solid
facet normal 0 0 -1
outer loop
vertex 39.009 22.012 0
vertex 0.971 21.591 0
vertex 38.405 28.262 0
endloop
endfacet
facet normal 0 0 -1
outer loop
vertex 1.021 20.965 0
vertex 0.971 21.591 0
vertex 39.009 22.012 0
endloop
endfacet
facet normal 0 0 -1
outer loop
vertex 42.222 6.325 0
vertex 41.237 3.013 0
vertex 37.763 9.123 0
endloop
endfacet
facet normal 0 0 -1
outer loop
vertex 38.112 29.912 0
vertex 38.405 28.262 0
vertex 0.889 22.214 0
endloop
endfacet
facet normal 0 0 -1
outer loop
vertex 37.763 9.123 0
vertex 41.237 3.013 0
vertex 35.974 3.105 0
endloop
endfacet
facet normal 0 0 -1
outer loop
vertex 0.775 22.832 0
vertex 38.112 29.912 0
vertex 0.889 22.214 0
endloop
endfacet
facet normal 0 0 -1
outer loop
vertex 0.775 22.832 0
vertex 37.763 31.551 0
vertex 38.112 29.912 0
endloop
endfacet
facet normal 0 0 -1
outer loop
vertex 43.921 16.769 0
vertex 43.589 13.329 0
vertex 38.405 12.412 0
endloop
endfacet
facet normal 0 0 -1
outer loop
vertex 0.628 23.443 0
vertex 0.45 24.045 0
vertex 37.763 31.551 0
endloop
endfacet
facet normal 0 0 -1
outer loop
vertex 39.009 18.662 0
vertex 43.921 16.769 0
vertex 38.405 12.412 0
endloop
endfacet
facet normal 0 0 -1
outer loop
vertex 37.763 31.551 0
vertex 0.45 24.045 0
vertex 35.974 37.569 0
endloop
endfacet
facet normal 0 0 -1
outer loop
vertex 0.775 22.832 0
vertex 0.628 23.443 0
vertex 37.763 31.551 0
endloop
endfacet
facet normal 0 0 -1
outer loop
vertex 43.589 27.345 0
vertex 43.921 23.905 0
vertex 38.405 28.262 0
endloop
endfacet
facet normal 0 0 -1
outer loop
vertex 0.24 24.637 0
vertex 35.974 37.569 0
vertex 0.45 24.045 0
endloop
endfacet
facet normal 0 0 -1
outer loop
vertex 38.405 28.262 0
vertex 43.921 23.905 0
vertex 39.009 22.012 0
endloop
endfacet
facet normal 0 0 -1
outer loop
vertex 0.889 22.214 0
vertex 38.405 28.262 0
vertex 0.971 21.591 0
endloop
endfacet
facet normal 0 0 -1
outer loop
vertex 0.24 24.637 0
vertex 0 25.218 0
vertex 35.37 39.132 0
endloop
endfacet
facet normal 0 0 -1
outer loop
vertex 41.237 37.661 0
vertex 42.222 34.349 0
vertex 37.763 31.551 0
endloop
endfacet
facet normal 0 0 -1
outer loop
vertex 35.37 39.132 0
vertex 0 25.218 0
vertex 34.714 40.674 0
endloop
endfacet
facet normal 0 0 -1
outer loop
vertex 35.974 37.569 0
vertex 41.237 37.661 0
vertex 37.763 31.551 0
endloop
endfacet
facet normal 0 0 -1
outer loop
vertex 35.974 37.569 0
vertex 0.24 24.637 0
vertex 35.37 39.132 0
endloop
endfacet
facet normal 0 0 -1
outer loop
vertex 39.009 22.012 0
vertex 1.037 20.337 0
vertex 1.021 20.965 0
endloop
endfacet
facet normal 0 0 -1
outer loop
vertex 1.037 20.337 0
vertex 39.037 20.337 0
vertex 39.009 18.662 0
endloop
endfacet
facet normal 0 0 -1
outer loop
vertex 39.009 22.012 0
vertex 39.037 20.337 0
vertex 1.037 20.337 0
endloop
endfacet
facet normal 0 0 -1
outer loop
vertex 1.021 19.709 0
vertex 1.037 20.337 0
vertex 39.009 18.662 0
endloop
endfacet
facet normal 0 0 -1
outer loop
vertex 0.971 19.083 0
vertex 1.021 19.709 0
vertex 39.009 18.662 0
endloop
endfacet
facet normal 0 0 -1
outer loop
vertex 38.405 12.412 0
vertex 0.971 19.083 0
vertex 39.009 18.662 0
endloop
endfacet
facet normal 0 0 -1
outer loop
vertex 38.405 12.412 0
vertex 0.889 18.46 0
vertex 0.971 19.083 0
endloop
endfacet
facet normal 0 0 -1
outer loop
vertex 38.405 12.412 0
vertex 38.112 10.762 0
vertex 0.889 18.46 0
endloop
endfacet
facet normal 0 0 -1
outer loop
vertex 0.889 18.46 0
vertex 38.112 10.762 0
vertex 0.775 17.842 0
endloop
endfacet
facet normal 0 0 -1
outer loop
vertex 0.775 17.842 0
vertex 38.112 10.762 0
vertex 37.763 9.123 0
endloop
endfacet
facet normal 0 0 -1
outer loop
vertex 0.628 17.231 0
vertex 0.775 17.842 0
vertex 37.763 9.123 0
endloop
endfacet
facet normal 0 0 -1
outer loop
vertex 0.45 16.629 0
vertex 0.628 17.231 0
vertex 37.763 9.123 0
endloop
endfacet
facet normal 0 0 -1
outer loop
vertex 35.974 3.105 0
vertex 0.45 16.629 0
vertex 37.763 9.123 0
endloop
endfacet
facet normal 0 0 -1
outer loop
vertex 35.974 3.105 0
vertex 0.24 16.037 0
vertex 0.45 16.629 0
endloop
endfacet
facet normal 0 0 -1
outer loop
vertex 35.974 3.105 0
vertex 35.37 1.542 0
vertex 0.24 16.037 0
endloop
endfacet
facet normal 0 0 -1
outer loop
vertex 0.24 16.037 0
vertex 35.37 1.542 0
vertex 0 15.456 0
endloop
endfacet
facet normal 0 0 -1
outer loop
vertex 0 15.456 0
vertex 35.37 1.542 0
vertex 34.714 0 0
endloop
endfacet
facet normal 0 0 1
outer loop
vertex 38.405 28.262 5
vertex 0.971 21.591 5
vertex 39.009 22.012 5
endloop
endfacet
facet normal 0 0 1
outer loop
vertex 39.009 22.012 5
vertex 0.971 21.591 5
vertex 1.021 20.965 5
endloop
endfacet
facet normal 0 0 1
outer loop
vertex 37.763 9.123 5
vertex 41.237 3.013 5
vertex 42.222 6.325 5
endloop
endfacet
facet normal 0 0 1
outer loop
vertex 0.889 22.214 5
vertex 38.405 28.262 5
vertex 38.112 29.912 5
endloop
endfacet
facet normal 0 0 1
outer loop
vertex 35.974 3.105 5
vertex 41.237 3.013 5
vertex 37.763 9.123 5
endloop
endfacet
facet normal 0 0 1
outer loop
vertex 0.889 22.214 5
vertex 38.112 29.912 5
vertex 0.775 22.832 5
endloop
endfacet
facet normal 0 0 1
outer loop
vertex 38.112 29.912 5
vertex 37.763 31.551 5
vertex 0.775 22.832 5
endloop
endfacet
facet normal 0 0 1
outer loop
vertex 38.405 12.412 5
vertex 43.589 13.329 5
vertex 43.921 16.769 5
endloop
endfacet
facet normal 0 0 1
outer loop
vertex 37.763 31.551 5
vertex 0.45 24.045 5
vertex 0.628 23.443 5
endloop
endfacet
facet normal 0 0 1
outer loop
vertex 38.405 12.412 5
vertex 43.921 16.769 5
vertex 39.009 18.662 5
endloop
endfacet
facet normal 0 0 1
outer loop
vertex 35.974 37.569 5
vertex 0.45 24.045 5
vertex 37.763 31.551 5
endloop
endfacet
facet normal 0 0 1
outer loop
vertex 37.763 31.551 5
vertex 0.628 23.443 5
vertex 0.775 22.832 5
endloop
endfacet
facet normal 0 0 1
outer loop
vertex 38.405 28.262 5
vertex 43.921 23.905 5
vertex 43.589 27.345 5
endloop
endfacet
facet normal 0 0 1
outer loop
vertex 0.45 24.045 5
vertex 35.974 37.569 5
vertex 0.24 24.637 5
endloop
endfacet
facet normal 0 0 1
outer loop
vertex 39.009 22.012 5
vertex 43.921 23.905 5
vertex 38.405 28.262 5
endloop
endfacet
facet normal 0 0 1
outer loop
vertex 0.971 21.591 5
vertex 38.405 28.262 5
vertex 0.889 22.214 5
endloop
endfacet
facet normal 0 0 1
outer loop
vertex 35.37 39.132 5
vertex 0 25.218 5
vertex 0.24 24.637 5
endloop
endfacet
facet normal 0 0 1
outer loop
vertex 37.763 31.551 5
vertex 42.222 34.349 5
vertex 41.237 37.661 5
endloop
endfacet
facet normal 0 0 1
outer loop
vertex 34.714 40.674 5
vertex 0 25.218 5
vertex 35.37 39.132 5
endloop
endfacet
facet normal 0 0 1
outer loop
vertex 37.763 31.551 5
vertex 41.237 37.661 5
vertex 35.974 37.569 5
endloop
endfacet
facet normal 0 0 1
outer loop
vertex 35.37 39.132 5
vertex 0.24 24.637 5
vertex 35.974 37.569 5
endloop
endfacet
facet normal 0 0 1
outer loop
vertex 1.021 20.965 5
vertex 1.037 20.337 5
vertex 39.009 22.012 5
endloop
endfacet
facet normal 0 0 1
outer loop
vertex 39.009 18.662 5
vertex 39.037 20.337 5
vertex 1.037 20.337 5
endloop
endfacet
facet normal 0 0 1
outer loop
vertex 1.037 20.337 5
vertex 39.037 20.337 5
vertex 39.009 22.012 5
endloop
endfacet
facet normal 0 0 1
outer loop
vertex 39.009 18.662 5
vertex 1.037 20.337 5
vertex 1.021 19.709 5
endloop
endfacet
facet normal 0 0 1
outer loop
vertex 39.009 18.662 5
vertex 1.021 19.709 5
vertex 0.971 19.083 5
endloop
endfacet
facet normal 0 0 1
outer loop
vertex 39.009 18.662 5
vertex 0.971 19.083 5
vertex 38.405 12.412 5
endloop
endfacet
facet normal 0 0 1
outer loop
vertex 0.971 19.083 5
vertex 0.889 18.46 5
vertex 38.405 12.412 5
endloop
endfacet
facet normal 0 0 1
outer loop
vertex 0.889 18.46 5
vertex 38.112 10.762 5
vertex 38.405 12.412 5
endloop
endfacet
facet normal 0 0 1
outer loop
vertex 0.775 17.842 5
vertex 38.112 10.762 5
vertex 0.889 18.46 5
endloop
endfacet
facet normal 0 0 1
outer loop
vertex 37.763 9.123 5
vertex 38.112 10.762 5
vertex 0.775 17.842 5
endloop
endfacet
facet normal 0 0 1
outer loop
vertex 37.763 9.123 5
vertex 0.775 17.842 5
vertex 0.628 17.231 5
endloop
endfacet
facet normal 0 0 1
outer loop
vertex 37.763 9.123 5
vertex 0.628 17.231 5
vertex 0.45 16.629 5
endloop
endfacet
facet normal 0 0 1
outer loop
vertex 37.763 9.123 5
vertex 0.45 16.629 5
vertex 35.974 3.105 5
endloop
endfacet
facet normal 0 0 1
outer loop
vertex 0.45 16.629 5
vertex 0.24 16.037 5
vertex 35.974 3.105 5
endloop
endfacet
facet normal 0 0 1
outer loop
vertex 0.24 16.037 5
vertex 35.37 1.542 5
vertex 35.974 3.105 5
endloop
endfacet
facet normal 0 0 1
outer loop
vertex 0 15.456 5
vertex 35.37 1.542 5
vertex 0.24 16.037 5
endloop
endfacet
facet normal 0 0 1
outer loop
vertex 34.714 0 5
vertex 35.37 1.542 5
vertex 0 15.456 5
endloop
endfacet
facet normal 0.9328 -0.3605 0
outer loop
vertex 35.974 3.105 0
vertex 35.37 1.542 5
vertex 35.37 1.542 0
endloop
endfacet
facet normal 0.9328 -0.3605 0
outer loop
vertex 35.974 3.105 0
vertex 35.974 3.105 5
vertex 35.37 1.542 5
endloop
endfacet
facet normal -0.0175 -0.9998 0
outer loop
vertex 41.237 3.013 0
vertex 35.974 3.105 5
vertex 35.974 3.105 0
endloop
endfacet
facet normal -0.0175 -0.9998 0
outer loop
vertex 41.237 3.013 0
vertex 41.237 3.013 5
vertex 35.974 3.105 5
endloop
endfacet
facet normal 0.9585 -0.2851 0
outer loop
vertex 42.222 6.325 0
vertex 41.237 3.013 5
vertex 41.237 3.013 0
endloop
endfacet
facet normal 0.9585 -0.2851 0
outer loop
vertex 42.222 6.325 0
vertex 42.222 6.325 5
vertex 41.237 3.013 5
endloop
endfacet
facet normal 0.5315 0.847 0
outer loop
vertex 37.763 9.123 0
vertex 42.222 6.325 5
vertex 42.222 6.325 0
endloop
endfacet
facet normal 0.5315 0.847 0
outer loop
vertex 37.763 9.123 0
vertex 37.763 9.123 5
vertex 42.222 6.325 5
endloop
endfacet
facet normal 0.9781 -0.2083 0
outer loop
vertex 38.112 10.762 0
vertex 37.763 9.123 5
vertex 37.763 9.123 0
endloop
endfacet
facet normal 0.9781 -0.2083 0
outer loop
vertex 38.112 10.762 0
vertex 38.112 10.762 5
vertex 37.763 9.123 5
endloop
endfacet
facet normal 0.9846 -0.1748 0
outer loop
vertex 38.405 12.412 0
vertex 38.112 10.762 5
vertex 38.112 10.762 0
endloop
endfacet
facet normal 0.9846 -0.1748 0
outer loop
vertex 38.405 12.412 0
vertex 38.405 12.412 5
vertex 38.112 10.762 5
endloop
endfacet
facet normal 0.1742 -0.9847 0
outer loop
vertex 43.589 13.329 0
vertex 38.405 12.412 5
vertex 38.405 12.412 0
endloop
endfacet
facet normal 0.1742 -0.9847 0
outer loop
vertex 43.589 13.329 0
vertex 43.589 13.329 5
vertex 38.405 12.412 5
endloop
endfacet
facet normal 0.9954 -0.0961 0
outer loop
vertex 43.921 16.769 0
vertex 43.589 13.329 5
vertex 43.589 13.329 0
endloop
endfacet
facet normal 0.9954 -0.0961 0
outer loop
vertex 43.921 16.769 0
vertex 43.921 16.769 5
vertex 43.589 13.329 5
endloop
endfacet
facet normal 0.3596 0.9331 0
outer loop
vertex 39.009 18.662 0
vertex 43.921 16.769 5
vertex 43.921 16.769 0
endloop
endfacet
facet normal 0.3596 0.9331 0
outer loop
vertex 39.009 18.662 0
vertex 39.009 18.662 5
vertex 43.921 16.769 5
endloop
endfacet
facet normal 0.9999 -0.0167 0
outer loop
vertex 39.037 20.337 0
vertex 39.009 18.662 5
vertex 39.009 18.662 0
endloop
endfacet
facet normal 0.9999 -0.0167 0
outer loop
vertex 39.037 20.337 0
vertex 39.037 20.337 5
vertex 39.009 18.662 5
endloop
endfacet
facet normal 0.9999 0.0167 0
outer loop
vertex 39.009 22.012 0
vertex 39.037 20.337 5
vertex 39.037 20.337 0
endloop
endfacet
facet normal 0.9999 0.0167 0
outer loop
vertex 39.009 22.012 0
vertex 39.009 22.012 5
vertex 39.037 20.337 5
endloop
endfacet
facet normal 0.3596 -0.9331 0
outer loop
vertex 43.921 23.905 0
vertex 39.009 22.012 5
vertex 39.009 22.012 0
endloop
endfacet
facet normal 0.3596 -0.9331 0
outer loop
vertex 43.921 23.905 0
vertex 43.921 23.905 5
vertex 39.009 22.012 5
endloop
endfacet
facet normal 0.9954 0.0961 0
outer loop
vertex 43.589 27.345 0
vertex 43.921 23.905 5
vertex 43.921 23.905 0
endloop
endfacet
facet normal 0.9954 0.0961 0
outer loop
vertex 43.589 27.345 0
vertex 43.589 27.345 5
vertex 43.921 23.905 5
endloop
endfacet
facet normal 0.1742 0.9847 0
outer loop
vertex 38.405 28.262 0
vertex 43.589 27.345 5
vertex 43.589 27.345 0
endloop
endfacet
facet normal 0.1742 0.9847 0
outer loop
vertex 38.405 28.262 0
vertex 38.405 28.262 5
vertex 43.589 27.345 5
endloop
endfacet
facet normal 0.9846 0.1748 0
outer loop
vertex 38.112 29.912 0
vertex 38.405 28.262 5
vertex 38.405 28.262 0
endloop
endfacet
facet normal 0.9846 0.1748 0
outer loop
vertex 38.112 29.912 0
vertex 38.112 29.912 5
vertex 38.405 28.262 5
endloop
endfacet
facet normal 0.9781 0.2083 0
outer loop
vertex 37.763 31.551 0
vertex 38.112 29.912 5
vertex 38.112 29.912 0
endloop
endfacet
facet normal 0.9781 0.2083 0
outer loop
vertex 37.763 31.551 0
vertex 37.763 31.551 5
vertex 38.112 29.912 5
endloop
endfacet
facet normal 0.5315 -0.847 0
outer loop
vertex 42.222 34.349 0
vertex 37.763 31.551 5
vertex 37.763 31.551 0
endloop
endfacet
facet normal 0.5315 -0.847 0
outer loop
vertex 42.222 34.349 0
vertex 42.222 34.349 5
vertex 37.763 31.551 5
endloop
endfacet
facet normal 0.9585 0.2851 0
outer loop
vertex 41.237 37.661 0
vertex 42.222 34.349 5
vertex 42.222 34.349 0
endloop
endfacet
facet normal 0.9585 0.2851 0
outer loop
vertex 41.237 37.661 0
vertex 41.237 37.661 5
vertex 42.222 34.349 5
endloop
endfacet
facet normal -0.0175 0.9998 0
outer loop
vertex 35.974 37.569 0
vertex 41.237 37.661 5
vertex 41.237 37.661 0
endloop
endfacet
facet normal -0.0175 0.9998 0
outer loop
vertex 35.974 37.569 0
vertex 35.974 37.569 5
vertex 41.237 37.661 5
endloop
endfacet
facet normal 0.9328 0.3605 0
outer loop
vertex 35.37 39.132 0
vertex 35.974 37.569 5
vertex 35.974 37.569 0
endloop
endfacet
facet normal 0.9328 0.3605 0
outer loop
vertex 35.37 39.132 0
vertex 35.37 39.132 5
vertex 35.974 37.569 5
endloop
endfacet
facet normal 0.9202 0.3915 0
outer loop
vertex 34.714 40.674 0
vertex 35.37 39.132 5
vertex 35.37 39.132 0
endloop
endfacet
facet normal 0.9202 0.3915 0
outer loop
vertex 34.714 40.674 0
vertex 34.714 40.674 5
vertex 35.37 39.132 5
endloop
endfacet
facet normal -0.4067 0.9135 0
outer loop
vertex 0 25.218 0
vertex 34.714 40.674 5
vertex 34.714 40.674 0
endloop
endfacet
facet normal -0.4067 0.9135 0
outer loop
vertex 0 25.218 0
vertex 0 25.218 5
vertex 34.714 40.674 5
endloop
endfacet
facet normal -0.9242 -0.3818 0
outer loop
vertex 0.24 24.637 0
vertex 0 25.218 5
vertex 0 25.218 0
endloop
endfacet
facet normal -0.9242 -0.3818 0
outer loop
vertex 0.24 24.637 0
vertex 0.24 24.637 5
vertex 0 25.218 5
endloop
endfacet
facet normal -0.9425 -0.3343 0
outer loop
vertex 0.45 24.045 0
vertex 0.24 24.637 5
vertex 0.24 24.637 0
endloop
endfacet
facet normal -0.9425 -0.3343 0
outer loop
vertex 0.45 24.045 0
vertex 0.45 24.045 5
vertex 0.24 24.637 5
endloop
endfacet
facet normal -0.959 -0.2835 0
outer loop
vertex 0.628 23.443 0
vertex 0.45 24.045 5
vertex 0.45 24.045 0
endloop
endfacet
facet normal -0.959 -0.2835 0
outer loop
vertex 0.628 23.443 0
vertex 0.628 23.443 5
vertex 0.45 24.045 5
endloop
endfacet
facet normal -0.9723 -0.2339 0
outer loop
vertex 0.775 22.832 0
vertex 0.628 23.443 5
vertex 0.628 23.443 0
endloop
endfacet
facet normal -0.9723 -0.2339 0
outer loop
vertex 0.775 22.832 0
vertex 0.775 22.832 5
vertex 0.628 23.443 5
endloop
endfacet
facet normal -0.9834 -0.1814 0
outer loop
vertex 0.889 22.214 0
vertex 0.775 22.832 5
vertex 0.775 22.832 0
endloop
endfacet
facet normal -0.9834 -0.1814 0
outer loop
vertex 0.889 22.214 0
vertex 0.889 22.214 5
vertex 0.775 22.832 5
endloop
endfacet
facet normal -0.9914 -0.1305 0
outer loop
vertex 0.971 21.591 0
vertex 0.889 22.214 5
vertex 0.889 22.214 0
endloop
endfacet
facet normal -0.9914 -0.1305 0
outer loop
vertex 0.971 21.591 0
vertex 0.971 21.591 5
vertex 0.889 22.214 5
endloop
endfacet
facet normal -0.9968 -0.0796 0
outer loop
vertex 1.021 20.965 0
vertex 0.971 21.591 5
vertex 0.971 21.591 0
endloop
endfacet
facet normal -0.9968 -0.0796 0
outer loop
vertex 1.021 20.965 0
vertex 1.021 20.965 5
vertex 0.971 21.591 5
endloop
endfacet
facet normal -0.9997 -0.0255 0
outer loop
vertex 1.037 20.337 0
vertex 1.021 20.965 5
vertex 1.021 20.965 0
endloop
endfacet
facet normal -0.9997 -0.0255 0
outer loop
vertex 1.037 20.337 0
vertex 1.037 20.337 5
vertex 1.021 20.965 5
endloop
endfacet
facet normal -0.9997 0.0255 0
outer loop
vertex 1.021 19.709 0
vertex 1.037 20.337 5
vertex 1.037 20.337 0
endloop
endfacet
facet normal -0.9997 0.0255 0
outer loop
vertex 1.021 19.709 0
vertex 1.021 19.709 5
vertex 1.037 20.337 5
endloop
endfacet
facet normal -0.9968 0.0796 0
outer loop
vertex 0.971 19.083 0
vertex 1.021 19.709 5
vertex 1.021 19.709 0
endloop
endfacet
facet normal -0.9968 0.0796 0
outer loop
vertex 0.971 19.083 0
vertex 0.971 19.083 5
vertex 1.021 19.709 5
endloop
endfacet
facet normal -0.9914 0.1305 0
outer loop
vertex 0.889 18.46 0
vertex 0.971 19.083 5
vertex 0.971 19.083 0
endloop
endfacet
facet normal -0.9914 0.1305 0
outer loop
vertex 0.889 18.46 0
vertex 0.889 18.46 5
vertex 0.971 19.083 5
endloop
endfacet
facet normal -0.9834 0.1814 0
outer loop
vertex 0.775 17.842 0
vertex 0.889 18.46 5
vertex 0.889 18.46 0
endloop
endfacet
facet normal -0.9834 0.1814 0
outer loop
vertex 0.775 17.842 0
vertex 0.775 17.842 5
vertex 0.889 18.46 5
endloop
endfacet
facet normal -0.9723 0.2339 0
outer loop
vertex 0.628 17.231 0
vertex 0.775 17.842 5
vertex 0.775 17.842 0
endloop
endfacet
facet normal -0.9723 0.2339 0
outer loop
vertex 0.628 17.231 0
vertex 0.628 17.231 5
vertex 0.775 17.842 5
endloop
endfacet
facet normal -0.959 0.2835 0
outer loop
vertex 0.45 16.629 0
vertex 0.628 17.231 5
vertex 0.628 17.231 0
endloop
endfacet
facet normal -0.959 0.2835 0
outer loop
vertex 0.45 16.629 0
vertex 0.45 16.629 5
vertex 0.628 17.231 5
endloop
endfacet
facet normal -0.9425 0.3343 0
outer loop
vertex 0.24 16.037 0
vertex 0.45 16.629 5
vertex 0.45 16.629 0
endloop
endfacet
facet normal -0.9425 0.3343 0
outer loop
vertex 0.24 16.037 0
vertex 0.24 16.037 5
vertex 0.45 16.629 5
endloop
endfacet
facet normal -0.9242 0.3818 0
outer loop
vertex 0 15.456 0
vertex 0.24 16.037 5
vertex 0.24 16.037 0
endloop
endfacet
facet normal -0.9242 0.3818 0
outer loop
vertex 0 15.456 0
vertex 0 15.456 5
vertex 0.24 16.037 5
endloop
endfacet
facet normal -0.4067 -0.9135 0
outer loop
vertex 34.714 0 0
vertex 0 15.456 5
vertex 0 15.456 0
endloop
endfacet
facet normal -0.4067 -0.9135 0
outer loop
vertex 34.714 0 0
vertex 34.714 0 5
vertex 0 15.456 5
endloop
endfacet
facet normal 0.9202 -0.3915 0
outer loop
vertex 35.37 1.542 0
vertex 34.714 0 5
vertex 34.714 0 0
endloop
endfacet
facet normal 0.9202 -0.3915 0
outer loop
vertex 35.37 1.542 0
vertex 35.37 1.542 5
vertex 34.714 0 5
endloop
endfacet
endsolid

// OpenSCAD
$fn = 32;

// ----------------------------------------------------------------------
// Gear sector: 4 teeth on 48 degrees
// ----------------------------------------------------------------------

// --- parameters (mm) ---
sector_angle = 48;        // sector angle, degrees
root_r = 50;              // root circle radius
tooth_h = 5;              // tooth height over the root circle
teeth = 4;                // number of teeth on the sector
hub_r = 12;               // hub bore radius
plate_t = 5;              // sector thickness, Z
arc_step = 3;             // sampling step of the root/hub arcs, degrees

tip_r = root_r + tooth_h;  // tip circle radius

profile = [[34.714, 0], [35.37, 1.542], [35.974, 3.105], [41.237, 3.013], [42.222, 6.325], [37.763, 9.123], [38.112, 10.762], [38.405, 12.412], [43.589, 13.329], [43.921, 16.769], [39.009, 18.662], [39.037, 20.337], [39.009, 22.012], [43.921, 23.905], [43.589, 27.345], [38.405, 28.262], [38.112, 29.912], [37.763, 31.551], [42.222, 34.349], [41.237, 37.661], [35.974, 37.569], [35.37, 39.132], [34.714, 40.674], [0, 25.218], [0.24, 24.637], [0.45, 24.045], [0.628, 23.443], [0.775, 22.832], [0.889, 22.214], [0.971, 21.591], [1.021, 20.965], [1.037, 20.337], [1.021, 19.709], [0.971, 19.083], [0.889, 18.46], [0.775, 17.842], [0.628, 17.231], [0.45, 16.629], [0.24, 16.037], [0, 15.456]];  // primary outline, 40 points, counter clockwise

// --- the one profile operation ---
linear_extrude(height = plate_t) polygon(points = profile);
